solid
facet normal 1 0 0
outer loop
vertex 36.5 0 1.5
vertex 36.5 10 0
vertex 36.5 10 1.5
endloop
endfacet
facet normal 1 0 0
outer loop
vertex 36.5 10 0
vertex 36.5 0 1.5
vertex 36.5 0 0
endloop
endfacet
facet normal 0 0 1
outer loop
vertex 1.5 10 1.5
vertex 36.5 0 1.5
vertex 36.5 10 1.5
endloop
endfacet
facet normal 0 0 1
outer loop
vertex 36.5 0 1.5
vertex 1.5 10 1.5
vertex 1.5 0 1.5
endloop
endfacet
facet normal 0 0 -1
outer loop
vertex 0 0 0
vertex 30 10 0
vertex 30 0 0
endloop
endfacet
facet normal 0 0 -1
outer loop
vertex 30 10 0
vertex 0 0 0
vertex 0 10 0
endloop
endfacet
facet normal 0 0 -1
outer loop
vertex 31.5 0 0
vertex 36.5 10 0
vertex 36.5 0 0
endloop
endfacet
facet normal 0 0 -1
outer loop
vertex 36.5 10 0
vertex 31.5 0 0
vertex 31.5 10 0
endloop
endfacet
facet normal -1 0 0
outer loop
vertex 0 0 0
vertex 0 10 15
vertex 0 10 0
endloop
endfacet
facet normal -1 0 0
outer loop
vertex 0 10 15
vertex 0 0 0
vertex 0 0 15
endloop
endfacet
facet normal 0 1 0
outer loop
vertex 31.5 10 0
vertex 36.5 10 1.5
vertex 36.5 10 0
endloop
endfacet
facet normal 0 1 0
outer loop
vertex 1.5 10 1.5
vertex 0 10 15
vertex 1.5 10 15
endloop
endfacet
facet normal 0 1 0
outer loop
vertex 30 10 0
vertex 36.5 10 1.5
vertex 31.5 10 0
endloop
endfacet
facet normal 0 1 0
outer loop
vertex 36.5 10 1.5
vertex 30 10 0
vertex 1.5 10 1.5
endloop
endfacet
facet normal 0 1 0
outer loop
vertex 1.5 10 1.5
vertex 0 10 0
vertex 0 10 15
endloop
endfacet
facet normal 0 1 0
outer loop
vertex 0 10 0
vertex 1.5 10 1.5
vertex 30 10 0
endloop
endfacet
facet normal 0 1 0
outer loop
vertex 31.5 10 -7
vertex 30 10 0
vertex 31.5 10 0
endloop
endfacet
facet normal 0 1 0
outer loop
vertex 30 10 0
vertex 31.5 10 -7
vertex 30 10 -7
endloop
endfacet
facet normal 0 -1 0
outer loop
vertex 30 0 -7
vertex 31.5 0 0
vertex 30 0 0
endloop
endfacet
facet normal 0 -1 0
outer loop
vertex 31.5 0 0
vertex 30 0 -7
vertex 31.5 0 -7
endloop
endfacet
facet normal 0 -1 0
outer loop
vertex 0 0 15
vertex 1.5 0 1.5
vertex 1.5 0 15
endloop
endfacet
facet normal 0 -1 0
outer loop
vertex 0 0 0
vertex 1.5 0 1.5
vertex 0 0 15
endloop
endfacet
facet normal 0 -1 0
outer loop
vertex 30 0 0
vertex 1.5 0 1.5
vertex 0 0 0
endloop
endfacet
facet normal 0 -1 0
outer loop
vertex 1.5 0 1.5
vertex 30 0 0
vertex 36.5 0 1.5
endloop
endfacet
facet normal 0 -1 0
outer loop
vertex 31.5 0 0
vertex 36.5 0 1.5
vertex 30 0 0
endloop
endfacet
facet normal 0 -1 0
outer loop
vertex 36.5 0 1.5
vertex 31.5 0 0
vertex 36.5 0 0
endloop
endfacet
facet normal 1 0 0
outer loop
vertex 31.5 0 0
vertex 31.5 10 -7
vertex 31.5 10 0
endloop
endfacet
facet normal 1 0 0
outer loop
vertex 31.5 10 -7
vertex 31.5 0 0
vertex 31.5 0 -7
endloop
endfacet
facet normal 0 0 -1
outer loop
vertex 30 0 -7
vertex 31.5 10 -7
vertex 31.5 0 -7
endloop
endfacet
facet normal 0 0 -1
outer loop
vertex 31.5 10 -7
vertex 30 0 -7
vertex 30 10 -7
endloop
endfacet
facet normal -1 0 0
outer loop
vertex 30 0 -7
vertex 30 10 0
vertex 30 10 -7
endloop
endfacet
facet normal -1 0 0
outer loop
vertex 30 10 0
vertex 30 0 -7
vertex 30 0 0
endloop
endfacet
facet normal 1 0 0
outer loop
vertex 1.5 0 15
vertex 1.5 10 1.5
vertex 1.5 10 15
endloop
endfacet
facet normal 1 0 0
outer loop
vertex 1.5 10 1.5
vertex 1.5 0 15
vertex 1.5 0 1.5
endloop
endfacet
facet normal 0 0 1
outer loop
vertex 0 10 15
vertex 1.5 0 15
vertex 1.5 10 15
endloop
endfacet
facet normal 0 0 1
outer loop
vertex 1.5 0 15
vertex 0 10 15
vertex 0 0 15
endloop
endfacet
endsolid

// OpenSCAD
gap = 30;
t = 1.5;

h = 15;
overlap = 5;
dip = 7;

l = 10;

cube([overlap + gap + t, l, t]);
translate([gap, 0, -dip])
cube([t, l, dip + t]);
cube([t, l, h]);
